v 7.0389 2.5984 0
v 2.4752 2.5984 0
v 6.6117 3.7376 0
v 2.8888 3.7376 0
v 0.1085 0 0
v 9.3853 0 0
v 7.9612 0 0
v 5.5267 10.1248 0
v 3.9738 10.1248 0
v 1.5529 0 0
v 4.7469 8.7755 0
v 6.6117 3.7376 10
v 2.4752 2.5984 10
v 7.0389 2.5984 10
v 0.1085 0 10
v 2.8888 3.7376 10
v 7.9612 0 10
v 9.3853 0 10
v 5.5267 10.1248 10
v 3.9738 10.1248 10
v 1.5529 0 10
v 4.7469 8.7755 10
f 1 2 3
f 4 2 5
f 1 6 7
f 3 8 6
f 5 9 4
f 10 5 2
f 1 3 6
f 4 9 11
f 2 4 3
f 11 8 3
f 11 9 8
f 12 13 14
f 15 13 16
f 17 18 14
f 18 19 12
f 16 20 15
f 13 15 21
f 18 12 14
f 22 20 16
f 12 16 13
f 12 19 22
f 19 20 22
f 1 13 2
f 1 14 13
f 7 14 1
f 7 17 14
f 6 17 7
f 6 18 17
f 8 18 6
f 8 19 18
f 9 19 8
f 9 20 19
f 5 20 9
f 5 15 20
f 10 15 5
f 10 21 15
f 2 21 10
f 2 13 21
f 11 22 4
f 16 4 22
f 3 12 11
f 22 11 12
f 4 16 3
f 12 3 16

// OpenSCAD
// Generated by SolidPython 1.1.3 on 2025-02-16 19:31:27


linear_extrude(height = 10) {
	text(font = "Ariel", size = 10, text = "A");
}
/***********************************************
*********      SolidPython code:      **********
************************************************
 
from solid import *
from solid.utils import *
import subprocess

def letter_3d(letter, size, font):
    letter_2d = text(text=letter, size=size, font=font)

    letter_3d = linear_extrude(height=size)(letter_2d)

    return letter_3d

def intersection_3d(letter1, letter2, size, font):
    letter1_3d = letter_3d(letter1, size, font)
    letter2_3d = letter_3d(letter2, size, font)

    letter2_3d = rotate(a=90, v=[1,0,0])(letter2_3d)

    intersect = intersection()(letter1_3d, letter2_3d)

    return intersect



if __name__ == "__main__":
    # shape = intersection_3d("A", "B", 10, "Arial")
    shape = letter_3d("A", 10, "Ariel")
    scad_render_to_file(shape, 'AB_intersection.scad')

    subprocess.run(["C:\\Program Files\\OpenSCAD\\openscad.exe", "-o", "AB_intersection.stl", "AB_intersection.scad"])

 
 
************************************************/
